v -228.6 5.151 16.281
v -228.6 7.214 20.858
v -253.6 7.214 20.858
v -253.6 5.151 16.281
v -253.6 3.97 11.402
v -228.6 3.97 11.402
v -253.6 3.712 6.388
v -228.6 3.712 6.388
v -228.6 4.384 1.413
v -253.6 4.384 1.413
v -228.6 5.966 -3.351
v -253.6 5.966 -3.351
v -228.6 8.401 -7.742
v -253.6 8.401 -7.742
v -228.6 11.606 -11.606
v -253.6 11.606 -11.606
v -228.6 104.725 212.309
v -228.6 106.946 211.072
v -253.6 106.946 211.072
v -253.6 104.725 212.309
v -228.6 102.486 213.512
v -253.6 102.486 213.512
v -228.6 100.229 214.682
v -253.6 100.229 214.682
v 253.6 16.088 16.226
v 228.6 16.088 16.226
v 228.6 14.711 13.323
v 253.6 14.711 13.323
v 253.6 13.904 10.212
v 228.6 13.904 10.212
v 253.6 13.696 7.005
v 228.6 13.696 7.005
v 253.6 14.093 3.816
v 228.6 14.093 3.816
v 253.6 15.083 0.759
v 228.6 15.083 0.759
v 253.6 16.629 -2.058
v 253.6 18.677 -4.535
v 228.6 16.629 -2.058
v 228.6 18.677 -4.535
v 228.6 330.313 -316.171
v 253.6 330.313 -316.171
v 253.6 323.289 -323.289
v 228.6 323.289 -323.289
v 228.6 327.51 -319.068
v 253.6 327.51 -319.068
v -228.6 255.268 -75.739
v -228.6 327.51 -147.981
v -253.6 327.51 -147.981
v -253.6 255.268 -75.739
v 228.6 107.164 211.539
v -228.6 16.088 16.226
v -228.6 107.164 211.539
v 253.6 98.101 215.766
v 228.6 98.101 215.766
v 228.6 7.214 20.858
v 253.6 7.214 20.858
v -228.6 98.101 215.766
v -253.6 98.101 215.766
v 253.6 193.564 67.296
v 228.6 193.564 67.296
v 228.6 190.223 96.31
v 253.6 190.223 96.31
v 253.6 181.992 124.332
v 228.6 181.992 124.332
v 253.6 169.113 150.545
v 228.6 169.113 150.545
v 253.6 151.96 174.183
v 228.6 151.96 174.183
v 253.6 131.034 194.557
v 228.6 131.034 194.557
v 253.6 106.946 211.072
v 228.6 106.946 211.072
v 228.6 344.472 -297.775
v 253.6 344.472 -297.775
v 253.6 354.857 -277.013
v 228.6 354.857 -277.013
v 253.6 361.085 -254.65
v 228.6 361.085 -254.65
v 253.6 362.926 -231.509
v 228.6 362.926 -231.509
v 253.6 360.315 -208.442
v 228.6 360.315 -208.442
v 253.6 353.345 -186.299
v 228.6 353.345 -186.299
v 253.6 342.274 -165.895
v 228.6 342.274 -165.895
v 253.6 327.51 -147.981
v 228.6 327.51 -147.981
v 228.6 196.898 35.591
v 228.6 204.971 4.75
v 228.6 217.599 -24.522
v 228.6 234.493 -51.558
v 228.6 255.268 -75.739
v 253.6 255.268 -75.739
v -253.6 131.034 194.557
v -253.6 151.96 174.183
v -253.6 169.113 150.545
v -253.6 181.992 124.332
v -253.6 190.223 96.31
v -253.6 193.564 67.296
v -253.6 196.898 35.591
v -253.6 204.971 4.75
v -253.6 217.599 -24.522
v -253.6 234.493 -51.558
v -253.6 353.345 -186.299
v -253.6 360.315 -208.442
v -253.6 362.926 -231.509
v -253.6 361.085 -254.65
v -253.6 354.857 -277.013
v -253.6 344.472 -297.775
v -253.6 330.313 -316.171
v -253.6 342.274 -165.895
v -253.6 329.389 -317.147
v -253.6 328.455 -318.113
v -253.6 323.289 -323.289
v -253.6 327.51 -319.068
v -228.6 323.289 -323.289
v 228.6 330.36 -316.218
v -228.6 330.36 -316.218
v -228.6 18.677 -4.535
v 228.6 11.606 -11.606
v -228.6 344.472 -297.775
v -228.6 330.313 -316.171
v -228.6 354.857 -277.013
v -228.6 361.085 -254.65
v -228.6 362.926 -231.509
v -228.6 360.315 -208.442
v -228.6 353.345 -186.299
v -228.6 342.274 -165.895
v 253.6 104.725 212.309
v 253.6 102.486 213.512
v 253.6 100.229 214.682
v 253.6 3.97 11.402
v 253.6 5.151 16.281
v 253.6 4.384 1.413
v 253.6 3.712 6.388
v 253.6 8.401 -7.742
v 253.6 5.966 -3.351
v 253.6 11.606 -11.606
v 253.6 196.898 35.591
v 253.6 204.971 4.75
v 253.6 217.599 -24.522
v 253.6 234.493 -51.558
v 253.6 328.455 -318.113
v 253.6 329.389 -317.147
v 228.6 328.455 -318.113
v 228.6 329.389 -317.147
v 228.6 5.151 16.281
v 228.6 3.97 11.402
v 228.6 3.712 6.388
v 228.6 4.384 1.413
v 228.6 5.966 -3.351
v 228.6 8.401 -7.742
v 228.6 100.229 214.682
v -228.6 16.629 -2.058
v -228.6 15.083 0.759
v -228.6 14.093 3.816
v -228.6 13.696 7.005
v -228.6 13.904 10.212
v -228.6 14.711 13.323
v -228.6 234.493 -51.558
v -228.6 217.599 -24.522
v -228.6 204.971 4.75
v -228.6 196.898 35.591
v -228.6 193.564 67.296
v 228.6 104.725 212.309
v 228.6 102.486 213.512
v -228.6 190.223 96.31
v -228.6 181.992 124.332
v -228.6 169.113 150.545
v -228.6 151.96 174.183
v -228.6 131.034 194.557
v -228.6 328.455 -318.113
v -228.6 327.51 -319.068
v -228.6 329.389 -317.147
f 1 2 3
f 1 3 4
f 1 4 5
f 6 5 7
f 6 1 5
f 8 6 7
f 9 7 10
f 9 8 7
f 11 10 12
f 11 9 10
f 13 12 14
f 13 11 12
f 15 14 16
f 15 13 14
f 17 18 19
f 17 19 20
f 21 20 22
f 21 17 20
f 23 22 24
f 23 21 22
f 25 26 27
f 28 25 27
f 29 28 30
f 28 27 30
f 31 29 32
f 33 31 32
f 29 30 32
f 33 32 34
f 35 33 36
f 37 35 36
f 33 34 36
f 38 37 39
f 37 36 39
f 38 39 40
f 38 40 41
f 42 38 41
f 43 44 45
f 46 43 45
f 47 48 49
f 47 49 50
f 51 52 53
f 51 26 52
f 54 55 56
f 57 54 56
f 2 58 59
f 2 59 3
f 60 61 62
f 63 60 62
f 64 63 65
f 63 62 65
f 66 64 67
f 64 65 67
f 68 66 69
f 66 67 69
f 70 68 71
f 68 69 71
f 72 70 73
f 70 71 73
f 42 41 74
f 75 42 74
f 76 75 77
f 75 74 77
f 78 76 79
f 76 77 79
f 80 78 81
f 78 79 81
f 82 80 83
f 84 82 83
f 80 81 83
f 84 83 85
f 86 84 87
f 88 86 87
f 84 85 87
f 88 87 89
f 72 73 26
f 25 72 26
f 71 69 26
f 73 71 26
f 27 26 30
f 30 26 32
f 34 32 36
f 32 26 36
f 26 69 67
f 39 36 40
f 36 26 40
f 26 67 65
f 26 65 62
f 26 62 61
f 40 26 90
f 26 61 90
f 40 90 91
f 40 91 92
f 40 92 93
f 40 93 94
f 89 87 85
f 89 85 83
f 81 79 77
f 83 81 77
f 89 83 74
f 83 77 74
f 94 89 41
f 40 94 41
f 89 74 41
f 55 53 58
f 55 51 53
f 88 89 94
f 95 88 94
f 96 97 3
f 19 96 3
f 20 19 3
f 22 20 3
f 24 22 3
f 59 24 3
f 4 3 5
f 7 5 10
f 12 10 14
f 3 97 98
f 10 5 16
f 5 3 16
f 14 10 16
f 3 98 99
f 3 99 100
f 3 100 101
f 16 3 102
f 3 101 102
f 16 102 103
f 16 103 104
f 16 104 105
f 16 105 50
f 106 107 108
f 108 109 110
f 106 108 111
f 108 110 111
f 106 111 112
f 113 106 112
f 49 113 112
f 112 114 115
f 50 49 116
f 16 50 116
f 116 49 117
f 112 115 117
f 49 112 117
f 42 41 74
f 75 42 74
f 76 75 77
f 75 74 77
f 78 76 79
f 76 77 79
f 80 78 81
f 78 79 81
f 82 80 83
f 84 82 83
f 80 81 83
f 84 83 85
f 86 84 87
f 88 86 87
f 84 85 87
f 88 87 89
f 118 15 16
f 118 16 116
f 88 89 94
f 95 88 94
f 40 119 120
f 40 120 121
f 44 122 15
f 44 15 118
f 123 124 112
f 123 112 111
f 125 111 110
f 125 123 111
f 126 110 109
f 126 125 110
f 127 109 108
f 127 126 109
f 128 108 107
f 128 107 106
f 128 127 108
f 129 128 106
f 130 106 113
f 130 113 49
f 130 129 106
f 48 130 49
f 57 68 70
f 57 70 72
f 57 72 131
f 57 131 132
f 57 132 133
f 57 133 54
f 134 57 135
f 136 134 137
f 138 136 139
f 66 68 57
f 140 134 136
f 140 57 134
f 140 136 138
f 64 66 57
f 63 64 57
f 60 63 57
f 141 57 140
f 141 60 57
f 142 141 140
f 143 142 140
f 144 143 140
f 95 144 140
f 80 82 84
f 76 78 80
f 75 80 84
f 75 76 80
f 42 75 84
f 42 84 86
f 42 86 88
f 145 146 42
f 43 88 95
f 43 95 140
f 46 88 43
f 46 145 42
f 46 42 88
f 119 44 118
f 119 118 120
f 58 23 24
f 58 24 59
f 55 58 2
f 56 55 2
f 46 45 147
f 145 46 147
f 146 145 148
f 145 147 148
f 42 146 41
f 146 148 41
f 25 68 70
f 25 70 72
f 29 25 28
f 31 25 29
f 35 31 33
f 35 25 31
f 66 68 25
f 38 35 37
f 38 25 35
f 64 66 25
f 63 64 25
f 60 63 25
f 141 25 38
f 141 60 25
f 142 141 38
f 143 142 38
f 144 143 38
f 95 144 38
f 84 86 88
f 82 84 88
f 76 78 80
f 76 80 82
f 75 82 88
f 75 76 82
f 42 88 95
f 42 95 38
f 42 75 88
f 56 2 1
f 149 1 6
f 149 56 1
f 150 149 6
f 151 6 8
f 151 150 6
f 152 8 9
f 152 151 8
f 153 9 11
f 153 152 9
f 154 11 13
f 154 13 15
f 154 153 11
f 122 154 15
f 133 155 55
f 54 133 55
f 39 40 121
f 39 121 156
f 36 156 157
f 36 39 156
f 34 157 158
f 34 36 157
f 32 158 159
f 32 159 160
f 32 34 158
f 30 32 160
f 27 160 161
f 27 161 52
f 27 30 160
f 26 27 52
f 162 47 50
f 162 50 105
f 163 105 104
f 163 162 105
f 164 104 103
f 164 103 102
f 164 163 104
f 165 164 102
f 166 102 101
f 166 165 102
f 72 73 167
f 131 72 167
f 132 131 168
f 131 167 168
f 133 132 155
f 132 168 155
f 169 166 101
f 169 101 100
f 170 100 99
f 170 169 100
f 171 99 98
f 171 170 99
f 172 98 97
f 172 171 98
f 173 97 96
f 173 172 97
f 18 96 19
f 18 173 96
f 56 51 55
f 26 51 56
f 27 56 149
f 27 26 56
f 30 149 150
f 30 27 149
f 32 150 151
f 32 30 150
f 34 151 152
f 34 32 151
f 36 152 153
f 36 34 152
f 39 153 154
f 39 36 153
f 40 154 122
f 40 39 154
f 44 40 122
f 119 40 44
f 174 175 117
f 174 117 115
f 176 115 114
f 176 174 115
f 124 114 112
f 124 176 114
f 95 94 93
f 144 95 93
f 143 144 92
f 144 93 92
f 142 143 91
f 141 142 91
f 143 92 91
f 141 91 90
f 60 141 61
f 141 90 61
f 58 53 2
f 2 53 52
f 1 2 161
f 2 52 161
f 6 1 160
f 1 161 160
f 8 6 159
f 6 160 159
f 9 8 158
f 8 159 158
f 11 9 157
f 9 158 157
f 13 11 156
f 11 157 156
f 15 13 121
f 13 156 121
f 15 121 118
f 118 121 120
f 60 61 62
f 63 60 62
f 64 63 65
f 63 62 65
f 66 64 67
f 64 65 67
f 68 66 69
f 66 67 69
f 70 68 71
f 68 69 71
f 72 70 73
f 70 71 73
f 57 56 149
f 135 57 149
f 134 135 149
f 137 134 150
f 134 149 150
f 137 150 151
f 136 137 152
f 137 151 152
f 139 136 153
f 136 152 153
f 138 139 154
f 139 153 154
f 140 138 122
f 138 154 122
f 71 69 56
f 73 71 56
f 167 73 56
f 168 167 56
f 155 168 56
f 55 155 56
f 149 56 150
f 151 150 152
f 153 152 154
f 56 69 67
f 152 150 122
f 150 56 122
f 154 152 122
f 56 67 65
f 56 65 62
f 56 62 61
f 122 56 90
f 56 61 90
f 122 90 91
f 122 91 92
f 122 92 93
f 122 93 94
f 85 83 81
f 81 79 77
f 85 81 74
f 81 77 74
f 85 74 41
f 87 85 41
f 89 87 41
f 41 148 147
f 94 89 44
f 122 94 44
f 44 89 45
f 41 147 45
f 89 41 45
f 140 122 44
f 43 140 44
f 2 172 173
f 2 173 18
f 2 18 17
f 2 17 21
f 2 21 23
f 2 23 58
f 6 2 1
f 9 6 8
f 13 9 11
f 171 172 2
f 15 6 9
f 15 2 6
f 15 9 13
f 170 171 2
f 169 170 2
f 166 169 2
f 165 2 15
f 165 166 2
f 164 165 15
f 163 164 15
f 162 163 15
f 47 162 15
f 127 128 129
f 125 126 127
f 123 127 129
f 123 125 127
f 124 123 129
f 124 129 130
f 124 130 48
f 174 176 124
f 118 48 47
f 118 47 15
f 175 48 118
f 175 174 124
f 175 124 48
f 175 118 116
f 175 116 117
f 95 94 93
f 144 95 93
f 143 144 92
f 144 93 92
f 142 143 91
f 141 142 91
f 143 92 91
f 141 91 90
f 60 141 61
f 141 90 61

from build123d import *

# Parameters (mm, degrees)
EXTRUDE_THIN2_DEPTH = 228.6
BOSS_EXTRUDE1_DEPTH = 25
BOSS_EXTRUDE2_DEPTH = 25


with BuildPart() as part:
    # Sketch2 → Extrude-Thin2 (new, symmetric)
    with BuildSketch(Plane(origin=(0, 0, 0), x_dir=(0, 0, -1), z_dir=(1, 0, 0))):
        with BuildLine():
            Line((-215.765556665, 98.101326882), (-20.857742563, 7.214320532))
            ThreePointArc((-20.857742563, 7.214320532), (-3.885010881, 3.93226895), (11.605739191, 11.605739191))
            Line((11.605739191, 11.605739191), (323.289220358, 323.289220358))
            Line((323.289220358, 323.289220358), (316.218152547, 330.36028817))
            Line((316.218152547, 330.36028817), (4.534671379, 18.676807003))
            ThreePointArc((4.534671379, 18.676807003), (-5.401525765, 13.81913778), (-16.226282042, 16.088414212))
            Line((-16.226282042, 16.088414212), (-211.539374047, 107.164404752))
            Line((-211.539374047, 107.164404752), (-215.765556665, 98.101326882))
        make_face()
    extrude(amount=EXTRUDE_THIN2_DEPTH, both=True)


with BuildPart() as body_2:
    # Sketch3 → Boss-Extrude1 (new body)
    with BuildSketch(Plane(origin=(228.6, 0, 0), x_dir=(0, 0, -1), z_dir=(1, 0, 0))):
        with BuildLine():
            Line((4.534671379, 18.676807003), (316.170652418, 330.312788042))
            ThreePointArc((316.170652418, 330.312788042), (231.509072824, 362.926495212), (147.98120037, 327.509952779))
            Line((147.98120037, 327.509952779), (75.739307367, 255.268059776))
            ThreePointArc((75.739307367, 255.268059776), (10.125062359, 210.731135973), (-67.296210575, 193.563922251))
            ThreePointArc((-67.296210575, 193.563922251), (-150.544649092, 169.112572755), (-211.071774935, 106.946359705))
            Line((-211.071774935, 106.946359705), (-16.226282042, 16.088414212))
            ThreePointArc((-16.226282042, 16.088414212), (-5.401525765, 13.81913778), (4.534671379, 18.676807003))
        make_face()
    extrude(amount=BOSS_EXTRUDE1_DEPTH)


with BuildPart() as body_3:
    # Sketch3<3> → Boss-Extrude2 (new body)
    with BuildSketch(Plane(origin=(228.6, 0, 0), x_dir=(0, 0, -1), z_dir=(1, 0, 0))):
        with BuildLine():
            ThreePointArc((-20.857742563, 7.214320532), (-3.885010881, 3.93226895), (11.605739191, 11.605739191))
            Line((11.605739191, 11.605739191), (323.289220358, 323.289220358))
            Line((323.289220358, 323.289220358), (319.068487938, 327.509952779))
            ThreePointArc((319.068487938, 327.509952779), (233.524844154, 362.943290209), (147.98120037, 327.509952779))
            Line((147.98120037, 327.509952779), (75.739307367, 255.268059776))
            ThreePointArc((75.739307367, 255.268059776), (10.125062359, 210.731135973), (-67.296210575, 193.563922251))
            ThreePointArc((-67.296210575, 193.563922251), (-153.788956262, 167.108392258), (-214.682451636, 100.228856189))
            Line((-214.682451636, 100.228856189), (-215.765556665, 98.101326882))
            Line((-215.765556665, 98.101326882), (-20.857742563, 7.214320532))
        make_face()
    extrude(amount=BOSS_EXTRUDE2_DEPTH)


with BuildPart() as body_4:
    # Mirror11: mirrored copy
    add(body_3.part.mirror(Plane(origin=(0, 0, 0), x_dir=(0, 0, 1), z_dir=(1, 0, 0))))


solid = Compound([part.part, body_2.part, body_3.part, body_4.part])
